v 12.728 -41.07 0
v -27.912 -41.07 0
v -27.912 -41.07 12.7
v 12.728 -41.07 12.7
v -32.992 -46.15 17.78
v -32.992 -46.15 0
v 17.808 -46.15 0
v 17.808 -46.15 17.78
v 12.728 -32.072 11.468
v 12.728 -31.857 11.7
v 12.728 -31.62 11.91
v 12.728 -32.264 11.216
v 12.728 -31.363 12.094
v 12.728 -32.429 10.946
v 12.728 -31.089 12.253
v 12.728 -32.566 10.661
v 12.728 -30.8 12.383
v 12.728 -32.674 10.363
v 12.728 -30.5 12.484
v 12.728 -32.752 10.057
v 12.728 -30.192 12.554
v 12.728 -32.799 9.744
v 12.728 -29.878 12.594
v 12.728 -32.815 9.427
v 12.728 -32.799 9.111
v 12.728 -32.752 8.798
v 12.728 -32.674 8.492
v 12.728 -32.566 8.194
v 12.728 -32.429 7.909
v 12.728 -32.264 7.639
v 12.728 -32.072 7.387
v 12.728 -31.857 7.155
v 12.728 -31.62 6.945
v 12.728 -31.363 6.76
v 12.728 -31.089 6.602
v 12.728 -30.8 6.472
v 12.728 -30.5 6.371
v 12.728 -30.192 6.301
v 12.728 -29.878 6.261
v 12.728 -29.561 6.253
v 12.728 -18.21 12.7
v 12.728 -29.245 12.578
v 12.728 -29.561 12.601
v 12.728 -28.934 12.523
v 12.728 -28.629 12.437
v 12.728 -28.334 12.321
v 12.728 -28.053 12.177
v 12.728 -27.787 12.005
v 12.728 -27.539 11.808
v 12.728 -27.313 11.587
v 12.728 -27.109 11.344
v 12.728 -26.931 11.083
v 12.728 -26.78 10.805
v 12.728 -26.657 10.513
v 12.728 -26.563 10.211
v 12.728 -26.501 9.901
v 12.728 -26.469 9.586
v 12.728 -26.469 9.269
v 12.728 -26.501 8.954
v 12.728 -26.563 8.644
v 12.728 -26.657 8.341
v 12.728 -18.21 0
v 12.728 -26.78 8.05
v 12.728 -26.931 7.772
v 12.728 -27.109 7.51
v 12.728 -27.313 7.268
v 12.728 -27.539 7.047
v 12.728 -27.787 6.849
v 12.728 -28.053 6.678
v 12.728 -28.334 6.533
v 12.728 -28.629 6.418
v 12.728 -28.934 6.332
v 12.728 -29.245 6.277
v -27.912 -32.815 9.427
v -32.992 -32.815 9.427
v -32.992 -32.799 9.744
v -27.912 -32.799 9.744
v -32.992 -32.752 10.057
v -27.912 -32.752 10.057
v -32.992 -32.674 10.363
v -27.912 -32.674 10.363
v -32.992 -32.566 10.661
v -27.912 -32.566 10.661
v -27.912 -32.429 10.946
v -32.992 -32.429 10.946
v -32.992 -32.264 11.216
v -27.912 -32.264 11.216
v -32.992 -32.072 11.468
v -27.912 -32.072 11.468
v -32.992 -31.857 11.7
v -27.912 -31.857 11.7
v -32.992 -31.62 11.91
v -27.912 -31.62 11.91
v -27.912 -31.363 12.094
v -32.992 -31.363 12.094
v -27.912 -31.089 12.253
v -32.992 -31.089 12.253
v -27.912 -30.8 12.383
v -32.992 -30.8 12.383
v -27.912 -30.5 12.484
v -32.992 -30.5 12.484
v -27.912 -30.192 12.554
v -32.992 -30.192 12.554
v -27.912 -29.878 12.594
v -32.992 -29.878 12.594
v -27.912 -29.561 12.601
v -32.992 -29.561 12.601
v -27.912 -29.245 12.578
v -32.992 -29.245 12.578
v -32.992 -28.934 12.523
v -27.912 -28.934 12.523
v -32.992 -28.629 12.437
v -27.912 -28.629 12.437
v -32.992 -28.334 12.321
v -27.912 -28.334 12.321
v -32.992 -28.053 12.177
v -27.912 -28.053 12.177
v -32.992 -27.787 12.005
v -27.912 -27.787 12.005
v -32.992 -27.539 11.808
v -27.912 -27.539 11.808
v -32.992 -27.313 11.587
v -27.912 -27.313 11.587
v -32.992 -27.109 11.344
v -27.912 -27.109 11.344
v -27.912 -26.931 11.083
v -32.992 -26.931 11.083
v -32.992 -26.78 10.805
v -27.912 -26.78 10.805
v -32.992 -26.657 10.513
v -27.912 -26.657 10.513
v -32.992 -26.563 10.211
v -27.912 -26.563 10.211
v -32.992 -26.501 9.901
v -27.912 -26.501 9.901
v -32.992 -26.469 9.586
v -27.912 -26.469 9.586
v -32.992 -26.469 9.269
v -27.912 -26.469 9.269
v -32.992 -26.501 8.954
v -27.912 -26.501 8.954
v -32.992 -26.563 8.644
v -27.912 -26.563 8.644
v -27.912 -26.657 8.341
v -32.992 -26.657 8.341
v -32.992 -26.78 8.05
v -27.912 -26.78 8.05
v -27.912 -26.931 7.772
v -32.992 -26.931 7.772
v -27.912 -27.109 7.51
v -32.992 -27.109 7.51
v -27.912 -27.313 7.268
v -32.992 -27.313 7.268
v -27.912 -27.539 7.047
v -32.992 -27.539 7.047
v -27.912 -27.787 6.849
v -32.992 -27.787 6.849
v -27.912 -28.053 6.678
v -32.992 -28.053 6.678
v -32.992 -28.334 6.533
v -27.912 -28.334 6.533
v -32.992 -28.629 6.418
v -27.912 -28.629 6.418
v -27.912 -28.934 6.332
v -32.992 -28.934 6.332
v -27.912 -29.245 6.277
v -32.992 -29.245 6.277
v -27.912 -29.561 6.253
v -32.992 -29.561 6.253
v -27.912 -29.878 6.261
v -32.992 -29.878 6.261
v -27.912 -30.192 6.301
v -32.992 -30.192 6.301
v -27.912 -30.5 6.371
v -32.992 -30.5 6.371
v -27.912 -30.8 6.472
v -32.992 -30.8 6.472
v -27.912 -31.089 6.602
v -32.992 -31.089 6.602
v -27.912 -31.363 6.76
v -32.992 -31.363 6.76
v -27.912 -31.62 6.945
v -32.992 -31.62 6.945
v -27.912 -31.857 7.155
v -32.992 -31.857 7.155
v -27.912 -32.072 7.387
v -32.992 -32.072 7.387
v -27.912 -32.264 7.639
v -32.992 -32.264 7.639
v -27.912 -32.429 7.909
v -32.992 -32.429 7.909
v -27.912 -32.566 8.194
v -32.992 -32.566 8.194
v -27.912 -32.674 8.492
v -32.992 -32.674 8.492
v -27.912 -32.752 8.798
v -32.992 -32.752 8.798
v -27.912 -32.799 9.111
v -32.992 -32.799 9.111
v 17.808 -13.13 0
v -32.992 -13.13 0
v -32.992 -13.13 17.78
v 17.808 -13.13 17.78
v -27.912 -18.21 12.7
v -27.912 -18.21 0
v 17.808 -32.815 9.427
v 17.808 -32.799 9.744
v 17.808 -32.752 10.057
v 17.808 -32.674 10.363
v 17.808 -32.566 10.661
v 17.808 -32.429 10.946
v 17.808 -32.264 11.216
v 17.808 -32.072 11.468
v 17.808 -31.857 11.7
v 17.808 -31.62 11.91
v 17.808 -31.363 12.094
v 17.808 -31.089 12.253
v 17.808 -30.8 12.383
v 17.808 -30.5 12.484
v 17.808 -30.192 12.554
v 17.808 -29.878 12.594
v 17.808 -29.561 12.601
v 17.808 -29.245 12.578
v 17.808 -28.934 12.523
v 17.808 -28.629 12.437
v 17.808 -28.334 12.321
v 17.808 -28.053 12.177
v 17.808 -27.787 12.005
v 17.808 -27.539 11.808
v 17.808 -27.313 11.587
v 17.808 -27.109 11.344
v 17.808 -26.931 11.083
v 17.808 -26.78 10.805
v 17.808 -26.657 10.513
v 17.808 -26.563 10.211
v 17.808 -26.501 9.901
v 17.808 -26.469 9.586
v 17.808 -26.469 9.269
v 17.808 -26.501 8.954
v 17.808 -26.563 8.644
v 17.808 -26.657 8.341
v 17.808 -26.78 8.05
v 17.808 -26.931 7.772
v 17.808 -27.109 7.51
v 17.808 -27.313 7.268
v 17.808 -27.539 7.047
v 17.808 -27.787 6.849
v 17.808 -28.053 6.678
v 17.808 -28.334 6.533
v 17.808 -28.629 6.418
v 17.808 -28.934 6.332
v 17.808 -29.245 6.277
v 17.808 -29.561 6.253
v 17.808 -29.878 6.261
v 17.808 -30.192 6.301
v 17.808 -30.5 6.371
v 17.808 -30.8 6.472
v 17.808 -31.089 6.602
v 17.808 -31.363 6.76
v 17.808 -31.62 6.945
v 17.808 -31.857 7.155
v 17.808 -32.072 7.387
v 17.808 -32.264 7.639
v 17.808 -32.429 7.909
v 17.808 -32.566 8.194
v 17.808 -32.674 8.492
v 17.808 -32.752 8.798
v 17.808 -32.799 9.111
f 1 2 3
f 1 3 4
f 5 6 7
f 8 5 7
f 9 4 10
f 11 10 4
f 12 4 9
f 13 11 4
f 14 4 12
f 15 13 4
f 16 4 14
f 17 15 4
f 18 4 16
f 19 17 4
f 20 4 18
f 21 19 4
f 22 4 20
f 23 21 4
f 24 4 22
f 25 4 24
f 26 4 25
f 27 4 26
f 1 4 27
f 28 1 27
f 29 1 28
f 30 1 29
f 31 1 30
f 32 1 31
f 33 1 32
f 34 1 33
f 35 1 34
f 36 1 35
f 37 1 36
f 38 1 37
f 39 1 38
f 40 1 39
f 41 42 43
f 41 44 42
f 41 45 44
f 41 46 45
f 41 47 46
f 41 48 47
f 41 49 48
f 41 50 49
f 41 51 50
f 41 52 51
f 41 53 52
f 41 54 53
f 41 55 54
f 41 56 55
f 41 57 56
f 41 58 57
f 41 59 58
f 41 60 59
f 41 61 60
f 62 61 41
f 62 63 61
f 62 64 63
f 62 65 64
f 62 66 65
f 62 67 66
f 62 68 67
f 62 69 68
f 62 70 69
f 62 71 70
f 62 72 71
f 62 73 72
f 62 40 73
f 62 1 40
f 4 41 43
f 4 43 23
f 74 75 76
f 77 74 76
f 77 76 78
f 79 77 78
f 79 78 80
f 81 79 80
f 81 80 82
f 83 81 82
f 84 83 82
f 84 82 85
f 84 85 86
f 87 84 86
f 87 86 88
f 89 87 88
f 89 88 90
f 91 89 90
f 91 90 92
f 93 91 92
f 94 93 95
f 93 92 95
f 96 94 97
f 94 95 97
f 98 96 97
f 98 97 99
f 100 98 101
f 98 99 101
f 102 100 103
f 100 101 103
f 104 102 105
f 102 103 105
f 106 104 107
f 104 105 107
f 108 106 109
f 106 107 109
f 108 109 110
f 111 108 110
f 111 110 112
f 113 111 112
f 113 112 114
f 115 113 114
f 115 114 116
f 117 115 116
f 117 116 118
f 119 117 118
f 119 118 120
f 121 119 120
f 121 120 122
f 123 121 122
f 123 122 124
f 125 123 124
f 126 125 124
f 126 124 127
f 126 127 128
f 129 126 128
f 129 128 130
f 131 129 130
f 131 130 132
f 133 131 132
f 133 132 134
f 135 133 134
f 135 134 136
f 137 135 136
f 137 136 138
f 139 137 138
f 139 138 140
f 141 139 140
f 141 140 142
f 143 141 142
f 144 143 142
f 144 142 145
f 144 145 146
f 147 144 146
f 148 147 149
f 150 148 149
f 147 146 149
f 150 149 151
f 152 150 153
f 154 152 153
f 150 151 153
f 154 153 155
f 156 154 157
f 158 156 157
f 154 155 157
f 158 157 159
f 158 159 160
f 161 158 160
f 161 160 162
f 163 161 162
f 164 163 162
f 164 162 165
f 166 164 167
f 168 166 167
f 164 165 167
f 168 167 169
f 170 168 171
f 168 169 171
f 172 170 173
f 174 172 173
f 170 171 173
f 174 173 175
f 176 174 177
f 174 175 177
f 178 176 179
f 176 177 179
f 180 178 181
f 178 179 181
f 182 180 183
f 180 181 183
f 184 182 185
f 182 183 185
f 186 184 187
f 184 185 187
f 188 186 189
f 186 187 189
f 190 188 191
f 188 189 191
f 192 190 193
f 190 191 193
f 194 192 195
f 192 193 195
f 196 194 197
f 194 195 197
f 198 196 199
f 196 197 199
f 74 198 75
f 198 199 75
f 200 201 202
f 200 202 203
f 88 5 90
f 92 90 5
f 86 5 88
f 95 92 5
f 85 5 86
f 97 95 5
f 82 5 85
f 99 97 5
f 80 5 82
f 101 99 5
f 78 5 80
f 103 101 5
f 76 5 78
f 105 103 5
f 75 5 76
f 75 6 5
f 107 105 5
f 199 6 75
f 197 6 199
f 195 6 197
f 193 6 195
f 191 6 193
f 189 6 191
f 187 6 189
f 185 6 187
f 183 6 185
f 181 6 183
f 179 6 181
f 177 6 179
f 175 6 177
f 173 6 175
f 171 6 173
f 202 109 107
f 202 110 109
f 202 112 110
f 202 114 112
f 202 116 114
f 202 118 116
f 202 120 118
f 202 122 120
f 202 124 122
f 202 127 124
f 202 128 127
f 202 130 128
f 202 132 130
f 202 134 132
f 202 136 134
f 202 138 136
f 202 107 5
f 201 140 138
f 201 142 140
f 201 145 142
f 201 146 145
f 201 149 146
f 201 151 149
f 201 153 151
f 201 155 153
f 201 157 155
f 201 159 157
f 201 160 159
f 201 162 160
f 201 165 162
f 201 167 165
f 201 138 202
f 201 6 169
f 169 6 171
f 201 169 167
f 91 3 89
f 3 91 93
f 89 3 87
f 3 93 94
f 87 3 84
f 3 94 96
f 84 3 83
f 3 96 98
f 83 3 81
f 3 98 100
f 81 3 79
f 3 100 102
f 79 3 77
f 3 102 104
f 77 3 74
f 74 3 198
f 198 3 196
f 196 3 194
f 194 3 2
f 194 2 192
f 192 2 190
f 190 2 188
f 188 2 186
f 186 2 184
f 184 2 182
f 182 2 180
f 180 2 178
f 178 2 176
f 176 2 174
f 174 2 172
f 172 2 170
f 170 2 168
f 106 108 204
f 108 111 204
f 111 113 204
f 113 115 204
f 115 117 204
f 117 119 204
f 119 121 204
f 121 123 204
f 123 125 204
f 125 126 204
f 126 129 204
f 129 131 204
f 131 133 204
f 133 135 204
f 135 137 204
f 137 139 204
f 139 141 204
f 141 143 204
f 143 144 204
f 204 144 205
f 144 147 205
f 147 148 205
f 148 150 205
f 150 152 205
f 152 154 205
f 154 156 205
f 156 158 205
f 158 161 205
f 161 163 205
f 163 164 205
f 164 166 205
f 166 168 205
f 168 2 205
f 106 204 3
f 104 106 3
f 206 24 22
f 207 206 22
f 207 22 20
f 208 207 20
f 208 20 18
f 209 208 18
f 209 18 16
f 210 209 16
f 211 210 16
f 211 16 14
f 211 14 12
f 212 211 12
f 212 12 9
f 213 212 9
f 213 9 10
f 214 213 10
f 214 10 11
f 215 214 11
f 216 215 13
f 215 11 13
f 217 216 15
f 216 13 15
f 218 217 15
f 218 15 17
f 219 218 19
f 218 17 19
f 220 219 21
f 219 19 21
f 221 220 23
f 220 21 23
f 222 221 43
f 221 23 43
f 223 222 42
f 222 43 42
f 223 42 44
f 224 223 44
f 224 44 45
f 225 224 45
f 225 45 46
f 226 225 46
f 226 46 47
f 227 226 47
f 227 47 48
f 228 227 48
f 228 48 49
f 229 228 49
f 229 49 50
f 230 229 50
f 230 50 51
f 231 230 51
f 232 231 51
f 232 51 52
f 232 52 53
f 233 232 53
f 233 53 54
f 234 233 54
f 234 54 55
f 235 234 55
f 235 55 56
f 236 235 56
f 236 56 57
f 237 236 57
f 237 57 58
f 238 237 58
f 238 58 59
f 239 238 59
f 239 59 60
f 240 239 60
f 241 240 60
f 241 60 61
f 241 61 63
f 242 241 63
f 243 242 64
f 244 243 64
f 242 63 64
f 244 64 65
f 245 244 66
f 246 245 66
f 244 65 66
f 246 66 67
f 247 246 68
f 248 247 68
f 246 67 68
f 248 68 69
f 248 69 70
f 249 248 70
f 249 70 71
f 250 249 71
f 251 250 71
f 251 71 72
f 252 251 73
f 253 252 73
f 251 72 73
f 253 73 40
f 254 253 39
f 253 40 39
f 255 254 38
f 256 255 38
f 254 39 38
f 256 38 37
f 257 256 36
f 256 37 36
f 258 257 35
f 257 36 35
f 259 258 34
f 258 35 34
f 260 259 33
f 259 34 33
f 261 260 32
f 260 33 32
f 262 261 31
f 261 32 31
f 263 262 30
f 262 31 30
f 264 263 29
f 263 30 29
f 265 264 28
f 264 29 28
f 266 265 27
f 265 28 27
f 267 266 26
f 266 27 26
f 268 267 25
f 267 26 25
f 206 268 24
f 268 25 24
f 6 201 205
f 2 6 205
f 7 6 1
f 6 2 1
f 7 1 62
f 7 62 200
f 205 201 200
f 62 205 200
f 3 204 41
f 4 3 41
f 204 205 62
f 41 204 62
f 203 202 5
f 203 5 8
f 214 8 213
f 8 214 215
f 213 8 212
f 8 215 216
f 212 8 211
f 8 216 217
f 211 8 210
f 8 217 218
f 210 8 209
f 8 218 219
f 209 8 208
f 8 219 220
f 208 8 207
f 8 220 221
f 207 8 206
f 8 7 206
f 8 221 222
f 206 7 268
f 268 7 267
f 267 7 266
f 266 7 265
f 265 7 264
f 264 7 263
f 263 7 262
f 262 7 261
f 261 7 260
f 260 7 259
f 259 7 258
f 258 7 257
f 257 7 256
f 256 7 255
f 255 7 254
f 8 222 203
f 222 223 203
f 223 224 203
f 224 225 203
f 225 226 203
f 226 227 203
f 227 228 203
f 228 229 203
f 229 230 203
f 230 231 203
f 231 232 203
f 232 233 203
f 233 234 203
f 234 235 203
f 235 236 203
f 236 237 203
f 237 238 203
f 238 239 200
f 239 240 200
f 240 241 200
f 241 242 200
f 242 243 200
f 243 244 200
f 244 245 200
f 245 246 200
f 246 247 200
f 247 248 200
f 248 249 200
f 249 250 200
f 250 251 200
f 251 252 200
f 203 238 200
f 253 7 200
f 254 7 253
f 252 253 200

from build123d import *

# Parameters (mm, degrees)
F0_W     = 50.8
F0_H     = 33.02
F0_W_2   = 40.64
F0_H_2   = 22.86
F1_DEPTH = 17.78
F2_DEPTH = 12.7
F3_R     = 3.175
F4_DEPTH = 254


with BuildPart() as f1:
    # F0 (on Top) → F1 (new body)
    with BuildSketch(Plane.XY):
        with Locations((-7.5921734202, -29.6402639918)):
            Rectangle(F0_W, F0_H)
        with Locations((-7.5921734202, -29.6402639918)):
            Rectangle(F0_W_2, F0_H_2, mode=Mode.SUBTRACT)
        with Locations((-7.5921734202, -29.6402639918)):
            Rectangle(F0_W_2, F0_H_2)
    extrude(amount=F1_DEPTH)

    # F0 (on Top) → F2 (cut)
    with BuildSketch(Plane.XY):
        with Locations((-7.5921734202, -29.6402639918)):
            Rectangle(F0_W_2, F0_H_2)
    extrude(amount=F2_DEPTH, mode=Mode.SUBTRACT)

    # F3 (on face) → F4 (cut)
    with BuildSketch(Plane(origin=(-32.9921734202, 0, 0), x_dir=(0, -1, 0), z_dir=(-1, 0, 0))):
        with Locations((29.6402639918, 9.4274014091)):
            Circle(F3_R)
    extrude(amount=-F4_DEPTH, mode=Mode.SUBTRACT)


solid = f1.part
